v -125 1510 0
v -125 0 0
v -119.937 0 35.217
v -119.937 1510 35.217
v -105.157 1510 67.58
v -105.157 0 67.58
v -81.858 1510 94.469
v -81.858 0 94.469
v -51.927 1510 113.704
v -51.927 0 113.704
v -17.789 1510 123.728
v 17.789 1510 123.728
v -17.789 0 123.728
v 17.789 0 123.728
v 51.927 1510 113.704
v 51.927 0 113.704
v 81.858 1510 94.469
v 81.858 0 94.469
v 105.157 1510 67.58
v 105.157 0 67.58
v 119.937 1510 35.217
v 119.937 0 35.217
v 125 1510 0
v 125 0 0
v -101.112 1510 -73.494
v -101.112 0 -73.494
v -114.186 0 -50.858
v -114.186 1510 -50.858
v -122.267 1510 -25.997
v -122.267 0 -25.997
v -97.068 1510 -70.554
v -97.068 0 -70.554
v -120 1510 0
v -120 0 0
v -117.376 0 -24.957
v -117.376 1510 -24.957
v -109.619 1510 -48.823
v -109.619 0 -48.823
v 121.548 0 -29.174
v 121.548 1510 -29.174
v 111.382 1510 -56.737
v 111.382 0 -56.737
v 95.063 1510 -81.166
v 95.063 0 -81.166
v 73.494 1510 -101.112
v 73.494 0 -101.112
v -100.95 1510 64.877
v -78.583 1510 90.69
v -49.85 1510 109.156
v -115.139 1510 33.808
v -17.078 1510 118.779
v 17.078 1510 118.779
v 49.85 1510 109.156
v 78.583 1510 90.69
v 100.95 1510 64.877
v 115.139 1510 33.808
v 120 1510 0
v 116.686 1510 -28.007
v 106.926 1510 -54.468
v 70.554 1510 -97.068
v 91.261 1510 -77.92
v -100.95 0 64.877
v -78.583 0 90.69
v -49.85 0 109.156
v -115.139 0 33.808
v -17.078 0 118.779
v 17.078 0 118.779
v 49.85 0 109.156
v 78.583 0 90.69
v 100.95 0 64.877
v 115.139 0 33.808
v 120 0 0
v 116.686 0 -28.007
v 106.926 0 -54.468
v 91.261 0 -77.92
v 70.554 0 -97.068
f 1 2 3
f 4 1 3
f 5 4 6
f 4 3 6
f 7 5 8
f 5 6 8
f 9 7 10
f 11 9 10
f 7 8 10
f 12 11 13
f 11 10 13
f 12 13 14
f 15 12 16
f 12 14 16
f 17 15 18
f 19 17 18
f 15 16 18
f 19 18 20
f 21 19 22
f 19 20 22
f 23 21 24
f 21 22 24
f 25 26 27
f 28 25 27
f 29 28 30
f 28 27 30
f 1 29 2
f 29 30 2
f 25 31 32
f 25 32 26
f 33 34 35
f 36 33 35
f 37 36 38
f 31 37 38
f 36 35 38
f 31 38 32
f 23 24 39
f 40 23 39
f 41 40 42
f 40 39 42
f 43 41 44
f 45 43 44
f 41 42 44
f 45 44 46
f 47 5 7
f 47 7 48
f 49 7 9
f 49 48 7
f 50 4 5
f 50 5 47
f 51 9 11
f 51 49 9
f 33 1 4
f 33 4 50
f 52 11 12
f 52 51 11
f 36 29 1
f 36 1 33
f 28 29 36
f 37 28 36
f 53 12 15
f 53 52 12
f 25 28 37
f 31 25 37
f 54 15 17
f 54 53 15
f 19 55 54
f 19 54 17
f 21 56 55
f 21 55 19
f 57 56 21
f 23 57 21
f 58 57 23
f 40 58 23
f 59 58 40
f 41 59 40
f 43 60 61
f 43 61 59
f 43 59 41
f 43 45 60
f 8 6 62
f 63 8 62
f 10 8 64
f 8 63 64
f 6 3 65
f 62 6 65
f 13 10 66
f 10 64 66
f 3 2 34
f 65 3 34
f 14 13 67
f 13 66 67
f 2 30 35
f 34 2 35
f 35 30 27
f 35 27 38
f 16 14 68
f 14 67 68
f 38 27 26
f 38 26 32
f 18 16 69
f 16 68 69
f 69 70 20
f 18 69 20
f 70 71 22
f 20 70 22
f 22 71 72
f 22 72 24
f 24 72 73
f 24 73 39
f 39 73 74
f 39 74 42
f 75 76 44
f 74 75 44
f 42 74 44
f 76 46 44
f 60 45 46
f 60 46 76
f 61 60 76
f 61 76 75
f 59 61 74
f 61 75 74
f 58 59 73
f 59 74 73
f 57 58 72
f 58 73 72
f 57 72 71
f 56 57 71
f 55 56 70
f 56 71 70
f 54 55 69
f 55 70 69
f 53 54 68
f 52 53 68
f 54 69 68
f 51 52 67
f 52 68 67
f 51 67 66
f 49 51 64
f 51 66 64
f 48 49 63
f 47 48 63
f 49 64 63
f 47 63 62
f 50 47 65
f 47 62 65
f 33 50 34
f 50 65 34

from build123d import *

# Parameters (mm, degrees)
BOSS_EXTRUDE1_DEPTH = 1510


with BuildPart() as part:
    # Sketch2 → Boss-Extrude1 (new body)
    with BuildSketch(Plane(origin=(0, 0, 0), x_dir=(1, 0, 0), z_dir=(0, 1, 0))):
        with BuildLine():
            ThreePointArc((70.554092404, 97.067605539), (106.926355704, 54.467921346), (120, 0))
            Line((120, 0), (125, 0))
            ThreePointArc((125, 0), (111.381620526, 56.737418069), (73.493846254, 101.112089103))
            Line((73.493846254, 101.112089103), (70.554092404, 97.067605539))
        make_face()
        with BuildLine():
            Line((-125, 0), (-120, 0))
            ThreePointArc((-120, 0), (-114.122987747, 37.093714665), (-97.067605539, 70.554092404))
            Line((-97.067605539, 70.554092404), (-101.112089103, 73.493846254))
            ThreePointArc((-101.112089103, 73.493846254), (-118.878112237, 38.63928611), (-125, 0))
        make_face()
        with BuildLine():
            Line((125, 0), (120, 0))
            ThreePointArc((120, 0), (0, -120), (-120, 0))
            Line((-120, 0), (-125, 0))
            ThreePointArc((-125, 0), (0, -125), (125, 0))
        make_face()
    extrude(amount=BOSS_EXTRUDE1_DEPTH)


solid = part.part
